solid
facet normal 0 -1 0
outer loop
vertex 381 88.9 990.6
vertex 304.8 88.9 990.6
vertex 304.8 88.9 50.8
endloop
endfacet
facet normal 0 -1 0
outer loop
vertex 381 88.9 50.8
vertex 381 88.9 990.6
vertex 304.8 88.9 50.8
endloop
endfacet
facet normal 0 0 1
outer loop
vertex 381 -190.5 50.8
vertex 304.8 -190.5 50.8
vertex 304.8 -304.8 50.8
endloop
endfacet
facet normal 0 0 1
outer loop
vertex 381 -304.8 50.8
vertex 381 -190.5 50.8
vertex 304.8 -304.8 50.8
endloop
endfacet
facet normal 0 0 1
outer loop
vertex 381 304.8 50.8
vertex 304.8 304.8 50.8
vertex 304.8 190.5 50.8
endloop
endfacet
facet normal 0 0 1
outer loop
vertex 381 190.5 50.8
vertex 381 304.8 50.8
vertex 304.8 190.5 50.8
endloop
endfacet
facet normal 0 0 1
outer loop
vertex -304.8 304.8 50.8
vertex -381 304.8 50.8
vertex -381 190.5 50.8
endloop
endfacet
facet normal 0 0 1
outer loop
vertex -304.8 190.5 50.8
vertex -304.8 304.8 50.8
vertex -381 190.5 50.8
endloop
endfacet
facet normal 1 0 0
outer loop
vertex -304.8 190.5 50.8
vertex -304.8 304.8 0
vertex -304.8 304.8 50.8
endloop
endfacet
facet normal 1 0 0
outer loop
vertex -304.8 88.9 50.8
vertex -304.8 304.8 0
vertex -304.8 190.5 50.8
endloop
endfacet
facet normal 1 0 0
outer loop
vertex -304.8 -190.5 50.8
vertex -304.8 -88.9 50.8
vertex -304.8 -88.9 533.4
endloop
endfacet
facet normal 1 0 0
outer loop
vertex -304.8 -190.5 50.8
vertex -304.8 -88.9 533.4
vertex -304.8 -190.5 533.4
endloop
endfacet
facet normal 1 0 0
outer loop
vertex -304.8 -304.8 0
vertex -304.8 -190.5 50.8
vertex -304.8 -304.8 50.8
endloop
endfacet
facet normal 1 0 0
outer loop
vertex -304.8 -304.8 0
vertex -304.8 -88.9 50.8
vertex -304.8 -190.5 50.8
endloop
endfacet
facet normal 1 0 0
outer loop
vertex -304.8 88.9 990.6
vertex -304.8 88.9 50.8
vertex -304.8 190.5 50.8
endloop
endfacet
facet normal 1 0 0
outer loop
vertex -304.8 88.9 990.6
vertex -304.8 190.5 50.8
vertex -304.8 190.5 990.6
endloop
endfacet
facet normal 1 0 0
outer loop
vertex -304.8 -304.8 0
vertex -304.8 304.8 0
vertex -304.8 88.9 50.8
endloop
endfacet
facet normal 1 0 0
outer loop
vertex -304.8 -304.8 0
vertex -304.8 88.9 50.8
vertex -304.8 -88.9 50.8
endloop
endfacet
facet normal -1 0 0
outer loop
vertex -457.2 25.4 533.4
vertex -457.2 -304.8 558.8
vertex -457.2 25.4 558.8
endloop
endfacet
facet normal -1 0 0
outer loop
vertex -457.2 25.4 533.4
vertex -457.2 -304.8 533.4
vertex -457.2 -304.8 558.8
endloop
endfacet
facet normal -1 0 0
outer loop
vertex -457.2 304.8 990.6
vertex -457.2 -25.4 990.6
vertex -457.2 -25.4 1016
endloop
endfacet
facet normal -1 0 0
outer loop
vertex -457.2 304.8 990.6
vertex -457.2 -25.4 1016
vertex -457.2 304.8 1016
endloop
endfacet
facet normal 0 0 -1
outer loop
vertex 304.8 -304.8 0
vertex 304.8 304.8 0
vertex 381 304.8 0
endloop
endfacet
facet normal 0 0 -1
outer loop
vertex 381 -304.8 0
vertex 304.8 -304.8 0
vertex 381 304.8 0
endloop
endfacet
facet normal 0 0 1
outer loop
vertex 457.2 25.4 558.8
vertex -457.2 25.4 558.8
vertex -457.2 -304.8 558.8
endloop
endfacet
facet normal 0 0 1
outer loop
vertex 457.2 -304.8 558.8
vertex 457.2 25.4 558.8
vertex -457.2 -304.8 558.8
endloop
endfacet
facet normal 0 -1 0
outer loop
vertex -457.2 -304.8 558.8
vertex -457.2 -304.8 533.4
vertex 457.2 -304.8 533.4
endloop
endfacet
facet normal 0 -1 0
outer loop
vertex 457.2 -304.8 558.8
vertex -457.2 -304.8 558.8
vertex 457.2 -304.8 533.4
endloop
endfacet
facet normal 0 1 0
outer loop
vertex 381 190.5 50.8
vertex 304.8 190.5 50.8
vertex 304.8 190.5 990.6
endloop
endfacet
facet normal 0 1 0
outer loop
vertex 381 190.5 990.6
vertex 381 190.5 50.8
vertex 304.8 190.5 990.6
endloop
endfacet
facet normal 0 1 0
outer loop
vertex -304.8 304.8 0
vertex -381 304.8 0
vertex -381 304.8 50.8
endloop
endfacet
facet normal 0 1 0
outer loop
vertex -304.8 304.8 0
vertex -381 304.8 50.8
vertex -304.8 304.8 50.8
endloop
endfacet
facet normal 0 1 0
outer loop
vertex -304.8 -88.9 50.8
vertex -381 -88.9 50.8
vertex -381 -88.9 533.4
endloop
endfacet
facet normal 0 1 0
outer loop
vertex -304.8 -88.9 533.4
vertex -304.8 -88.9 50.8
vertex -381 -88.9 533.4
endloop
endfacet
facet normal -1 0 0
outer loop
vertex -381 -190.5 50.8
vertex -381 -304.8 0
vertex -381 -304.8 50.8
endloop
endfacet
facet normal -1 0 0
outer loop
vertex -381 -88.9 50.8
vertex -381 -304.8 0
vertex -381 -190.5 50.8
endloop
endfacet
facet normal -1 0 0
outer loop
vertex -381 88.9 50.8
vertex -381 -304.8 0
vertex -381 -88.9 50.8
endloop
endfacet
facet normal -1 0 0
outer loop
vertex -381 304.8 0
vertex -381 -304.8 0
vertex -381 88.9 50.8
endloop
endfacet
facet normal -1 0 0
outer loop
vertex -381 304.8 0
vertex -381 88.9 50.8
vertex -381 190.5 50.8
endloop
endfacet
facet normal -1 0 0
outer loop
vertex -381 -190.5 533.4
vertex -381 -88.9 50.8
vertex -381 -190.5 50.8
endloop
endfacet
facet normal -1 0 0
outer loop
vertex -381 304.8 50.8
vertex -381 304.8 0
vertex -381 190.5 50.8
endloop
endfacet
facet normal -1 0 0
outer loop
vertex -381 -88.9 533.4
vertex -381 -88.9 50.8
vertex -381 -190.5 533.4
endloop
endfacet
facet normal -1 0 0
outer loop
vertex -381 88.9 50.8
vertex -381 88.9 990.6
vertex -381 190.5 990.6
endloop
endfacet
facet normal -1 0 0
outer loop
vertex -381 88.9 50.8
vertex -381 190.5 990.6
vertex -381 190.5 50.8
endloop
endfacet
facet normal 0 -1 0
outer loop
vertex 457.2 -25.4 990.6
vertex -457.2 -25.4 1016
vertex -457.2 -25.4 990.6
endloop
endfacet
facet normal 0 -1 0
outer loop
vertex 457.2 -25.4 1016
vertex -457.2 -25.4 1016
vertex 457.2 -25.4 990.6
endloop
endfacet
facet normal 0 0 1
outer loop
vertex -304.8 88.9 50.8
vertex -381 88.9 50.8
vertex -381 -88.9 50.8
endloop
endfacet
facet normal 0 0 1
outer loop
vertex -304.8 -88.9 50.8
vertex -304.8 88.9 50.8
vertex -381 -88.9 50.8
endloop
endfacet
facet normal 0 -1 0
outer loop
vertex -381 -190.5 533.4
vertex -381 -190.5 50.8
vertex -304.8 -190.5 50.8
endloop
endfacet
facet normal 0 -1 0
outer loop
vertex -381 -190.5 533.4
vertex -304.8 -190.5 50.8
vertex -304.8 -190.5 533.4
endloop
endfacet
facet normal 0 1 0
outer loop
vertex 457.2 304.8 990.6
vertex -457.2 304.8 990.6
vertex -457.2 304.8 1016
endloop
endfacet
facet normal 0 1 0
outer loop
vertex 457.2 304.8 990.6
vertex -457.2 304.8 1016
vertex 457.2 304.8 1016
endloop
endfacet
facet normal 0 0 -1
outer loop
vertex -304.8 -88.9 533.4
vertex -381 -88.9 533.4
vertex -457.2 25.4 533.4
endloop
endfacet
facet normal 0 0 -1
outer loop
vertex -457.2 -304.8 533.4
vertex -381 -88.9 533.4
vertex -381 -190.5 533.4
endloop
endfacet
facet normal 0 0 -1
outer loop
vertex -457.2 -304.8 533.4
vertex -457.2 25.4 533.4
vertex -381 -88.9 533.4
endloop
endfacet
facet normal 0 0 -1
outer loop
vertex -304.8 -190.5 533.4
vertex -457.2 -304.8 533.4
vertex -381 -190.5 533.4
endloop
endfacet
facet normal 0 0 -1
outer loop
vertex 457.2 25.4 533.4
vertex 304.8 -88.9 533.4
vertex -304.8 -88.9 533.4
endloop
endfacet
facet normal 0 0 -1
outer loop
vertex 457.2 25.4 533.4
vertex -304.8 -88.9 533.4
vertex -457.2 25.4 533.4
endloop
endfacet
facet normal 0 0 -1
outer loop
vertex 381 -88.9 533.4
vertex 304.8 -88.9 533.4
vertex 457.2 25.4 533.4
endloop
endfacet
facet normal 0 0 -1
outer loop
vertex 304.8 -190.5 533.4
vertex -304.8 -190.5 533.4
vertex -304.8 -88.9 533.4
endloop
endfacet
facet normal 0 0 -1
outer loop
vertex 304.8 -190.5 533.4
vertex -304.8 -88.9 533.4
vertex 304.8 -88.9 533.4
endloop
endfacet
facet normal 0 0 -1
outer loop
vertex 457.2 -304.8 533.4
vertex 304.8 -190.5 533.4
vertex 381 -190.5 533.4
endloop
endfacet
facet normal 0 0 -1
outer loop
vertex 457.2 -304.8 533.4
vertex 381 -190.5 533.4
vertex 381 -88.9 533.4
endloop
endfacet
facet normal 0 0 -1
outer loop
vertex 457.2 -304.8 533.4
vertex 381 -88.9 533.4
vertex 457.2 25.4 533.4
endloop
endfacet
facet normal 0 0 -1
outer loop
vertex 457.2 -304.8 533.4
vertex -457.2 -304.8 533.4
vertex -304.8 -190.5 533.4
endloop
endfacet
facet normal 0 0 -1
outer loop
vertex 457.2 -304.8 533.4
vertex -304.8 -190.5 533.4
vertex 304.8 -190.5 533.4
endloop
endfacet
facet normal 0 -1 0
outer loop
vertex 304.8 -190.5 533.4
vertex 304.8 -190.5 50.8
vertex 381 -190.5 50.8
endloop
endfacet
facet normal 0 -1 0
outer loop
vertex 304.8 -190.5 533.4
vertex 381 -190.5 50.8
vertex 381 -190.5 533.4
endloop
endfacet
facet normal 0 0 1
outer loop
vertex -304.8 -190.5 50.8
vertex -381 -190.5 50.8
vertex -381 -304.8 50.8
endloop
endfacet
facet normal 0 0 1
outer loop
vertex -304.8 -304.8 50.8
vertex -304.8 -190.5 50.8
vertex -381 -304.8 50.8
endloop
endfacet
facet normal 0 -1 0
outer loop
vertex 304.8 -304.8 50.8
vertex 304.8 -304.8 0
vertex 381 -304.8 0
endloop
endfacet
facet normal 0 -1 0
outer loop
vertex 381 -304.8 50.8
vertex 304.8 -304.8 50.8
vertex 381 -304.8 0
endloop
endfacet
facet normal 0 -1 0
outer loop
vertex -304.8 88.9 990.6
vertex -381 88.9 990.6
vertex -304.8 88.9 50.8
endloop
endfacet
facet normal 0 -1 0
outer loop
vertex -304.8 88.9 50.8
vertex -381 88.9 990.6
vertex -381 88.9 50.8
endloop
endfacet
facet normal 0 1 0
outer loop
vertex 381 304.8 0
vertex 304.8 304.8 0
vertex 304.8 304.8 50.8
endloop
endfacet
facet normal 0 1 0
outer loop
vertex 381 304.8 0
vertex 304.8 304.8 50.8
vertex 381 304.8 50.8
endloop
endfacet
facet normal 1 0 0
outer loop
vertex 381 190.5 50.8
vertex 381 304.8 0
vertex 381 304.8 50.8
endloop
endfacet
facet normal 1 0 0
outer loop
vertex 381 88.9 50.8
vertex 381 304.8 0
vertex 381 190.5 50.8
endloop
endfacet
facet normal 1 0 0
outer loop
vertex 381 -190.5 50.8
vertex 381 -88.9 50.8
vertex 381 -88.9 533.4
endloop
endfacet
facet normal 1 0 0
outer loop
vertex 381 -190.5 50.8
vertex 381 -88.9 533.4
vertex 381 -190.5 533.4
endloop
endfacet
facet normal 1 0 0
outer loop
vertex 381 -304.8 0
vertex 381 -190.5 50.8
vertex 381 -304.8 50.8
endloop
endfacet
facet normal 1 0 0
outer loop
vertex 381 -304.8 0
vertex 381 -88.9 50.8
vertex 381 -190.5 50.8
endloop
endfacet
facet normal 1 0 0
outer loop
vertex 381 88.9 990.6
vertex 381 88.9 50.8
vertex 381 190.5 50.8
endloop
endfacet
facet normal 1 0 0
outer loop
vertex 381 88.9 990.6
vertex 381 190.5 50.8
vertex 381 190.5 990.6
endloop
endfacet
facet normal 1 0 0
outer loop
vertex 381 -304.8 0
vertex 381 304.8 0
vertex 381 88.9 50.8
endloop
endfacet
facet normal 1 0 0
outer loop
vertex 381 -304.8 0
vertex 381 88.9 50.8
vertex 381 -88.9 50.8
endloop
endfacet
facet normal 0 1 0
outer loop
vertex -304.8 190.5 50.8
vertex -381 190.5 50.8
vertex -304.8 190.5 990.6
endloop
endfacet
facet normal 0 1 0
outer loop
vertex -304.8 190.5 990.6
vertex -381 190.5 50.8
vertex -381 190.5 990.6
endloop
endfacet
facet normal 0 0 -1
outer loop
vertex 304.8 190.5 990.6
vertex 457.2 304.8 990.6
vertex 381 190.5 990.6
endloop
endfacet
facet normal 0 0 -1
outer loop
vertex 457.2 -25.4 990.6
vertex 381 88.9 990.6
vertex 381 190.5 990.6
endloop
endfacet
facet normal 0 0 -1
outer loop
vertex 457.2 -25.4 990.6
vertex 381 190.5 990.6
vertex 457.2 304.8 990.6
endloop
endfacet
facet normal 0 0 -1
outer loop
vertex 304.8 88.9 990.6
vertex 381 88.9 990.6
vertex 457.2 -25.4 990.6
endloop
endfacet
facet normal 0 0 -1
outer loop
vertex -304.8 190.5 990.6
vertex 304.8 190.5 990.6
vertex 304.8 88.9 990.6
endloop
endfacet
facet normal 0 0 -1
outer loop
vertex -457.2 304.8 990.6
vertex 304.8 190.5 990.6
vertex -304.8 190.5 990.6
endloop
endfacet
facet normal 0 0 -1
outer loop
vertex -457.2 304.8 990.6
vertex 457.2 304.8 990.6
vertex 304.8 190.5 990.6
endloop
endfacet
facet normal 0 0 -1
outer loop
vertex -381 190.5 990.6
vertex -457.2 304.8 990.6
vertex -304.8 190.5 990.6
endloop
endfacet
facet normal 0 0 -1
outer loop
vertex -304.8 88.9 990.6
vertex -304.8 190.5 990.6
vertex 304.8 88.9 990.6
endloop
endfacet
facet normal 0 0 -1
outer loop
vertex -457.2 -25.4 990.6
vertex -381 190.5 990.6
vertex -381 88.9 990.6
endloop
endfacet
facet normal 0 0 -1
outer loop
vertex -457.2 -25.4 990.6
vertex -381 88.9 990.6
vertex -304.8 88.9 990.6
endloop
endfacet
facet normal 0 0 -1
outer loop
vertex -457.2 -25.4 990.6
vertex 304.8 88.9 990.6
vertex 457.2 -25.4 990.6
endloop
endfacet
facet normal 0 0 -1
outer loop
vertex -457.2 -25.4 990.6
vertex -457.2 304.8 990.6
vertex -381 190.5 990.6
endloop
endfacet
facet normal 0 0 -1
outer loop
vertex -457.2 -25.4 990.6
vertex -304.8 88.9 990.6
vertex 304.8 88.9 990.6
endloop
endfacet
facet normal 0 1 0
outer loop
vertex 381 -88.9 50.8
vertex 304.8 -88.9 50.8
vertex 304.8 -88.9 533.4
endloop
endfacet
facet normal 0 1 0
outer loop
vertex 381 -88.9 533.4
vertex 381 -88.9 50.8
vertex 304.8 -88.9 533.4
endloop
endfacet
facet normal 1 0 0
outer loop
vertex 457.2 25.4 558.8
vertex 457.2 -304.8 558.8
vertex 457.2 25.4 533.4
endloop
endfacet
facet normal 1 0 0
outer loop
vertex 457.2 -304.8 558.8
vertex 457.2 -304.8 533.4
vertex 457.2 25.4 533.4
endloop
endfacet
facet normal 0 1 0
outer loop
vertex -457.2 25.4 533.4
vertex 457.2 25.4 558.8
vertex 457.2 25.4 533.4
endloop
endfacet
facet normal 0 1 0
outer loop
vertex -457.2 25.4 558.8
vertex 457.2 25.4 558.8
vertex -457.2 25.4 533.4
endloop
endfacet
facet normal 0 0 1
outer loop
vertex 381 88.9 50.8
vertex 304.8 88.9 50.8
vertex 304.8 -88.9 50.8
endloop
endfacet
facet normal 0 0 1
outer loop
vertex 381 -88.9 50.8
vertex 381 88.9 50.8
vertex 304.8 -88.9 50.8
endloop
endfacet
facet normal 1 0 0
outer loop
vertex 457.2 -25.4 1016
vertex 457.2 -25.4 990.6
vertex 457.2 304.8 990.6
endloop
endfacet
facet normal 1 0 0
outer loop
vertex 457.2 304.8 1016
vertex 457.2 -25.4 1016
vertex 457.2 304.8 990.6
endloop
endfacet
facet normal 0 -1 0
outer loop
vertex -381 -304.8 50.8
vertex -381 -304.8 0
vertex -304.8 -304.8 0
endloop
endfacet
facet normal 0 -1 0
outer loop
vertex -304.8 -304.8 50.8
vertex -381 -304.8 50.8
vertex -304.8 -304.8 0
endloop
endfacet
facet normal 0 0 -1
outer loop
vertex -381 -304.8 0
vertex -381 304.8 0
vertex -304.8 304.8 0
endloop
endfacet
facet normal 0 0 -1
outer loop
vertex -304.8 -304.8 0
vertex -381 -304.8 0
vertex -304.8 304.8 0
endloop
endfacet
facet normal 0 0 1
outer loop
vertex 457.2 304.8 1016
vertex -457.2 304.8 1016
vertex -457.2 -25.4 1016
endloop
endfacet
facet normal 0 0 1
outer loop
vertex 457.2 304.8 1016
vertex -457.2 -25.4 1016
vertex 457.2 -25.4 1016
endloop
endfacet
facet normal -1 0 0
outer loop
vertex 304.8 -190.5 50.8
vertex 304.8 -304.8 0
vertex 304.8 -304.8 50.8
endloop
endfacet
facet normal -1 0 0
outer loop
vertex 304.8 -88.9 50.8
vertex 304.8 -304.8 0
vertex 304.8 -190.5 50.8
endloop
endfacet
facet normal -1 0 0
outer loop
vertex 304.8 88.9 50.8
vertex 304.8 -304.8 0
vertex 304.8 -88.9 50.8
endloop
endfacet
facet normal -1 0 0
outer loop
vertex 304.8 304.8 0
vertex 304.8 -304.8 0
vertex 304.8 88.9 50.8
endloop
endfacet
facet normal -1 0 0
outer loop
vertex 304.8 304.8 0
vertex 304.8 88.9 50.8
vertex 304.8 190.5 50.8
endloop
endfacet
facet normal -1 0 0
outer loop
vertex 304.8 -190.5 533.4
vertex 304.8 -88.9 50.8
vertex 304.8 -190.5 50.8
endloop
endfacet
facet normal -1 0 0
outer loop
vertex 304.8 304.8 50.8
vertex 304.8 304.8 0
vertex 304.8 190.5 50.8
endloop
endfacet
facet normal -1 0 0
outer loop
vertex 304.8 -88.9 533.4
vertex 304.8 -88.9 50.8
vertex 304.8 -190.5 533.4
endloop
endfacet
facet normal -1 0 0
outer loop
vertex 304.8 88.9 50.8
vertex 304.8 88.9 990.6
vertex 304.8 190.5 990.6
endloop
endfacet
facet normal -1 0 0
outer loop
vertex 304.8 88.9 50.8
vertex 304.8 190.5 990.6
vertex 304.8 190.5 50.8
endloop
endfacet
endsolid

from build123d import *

# Parameters (mm, degrees)
F0_W      = 914.4
F0_H      = 609.6
F1_DEPTH  = 1016
F2_W      = 914.4
F2_H      = 279.4
F3_DEPTH  = 457.2
F4_W      = 76.2
F4_H      = 609.6
F4_W_2    = 609.6
F5_DEPTH  = 533.4
F6_W      = 25.4
F6_H      = 431.8
F7_DEPTH  = 914.4
F8_W      = 76.2
F8_H      = 25.4
F8_W_2    = 609.6
F9_DEPTH  = 279.4
F8_H_2    = 431.8
F10_DEPTH = 431.8
F11_DEPTH = 330.2
F12_W     = 114.3
F12_H     = 939.8
F13_DEPTH = 777.24
F12_H_2   = 482.6
F14_DEPTH = 878.84


with BuildPart() as f1:
    # F0 (on Top) → F1 (new body)
    with BuildSketch(Plane.XY):
        Rectangle(F0_W, F0_H)
    extrude(amount=F1_DEPTH)

    # F2 (on face) → F3 (cut)
    with BuildSketch(Plane.XY.offset(1016)):
        with Locations((0, -165.1)):
            Rectangle(F2_W, F2_H)
    extrude(amount=-F3_DEPTH, mode=Mode.SUBTRACT)

    # F4 (on face) → F5 (cut)
    with BuildSketch(Plane(origin=(0, 0, 0), x_dir=(1, 0, 0), z_dir=(0, 0, -1))):
        with Locations((-419.1, 0)):
            Rectangle(F4_W, F4_H)
        with Locations((419.1, 0)):
            Rectangle(F4_W, F4_H)
        Rectangle(F4_W_2, F4_H)
    extrude(amount=-F5_DEPTH, mode=Mode.SUBTRACT)

    # F6 (on face) → F7 (cut)
    with BuildSketch(Plane(origin=(-457.2, 0, 0), x_dir=(0, -1, 0), z_dir=(-1, 0, 0))):
        with Locations((12.7, 774.7)):
            Rectangle(F6_W, F6_H)
    extrude(amount=-F7_DEPTH, mode=Mode.SUBTRACT)

    # F8 (on face) → F9 (cut)
    with BuildSketch(Plane(origin=(0, 304.8, 0), x_dir=(-1, 0, 0), z_dir=(0, 1, 0))):
        with Locations((-419.1, 546.1)):
            Rectangle(F8_W, F8_H)
        with Locations((0, 546.1)):
            Rectangle(F8_W_2, F8_H)
        with Locations((419.1, 546.1)):
            Rectangle(F8_W, F8_H)
    extrude(amount=-F9_DEPTH, mode=Mode.SUBTRACT)

    # F8 (on face) → F10 (cut)
    with BuildSketch(Plane(origin=(0, 304.8, 0), x_dir=(-1, 0, 0), z_dir=(0, 1, 0))):
        with Locations((0, 774.7)):
            Rectangle(F8_W_2, F8_H_2)
    extrude(amount=-F10_DEPTH, mode=Mode.SUBTRACT)

    # F8 (on face) → F11 (cut)
    with BuildSketch(Plane(origin=(0, 304.8, 0), x_dir=(-1, 0, 0), z_dir=(0, 1, 0))):
        with Locations((-419.1, 774.7)):
            Rectangle(F8_W, F8_H_2)
        with Locations((419.1, 774.7)):
            Rectangle(F8_W, F8_H_2)
    extrude(amount=-F11_DEPTH, mode=Mode.SUBTRACT)

    # F12 (on face) → F13 (cut)
    with BuildSketch(Plane(origin=(-381, 0, 0), x_dir=(0, -1, 0), z_dir=(-1, 0, 0))):
        with Locations((-247.65, 520.7)):
            Rectangle(F12_W, F12_H)
    extrude(amount=-F13_DEPTH, mode=Mode.SUBTRACT)

    # F12 (on face) → F14 (cut)
    with BuildSketch(Plane(origin=(-381, 0, 0), x_dir=(0, -1, 0), z_dir=(-1, 0, 0))):
        Polygon((0, 990.6), (-88.9, 990.6), (-88.9, 558.8), (-25.4, 558.8), (0, 558.8), align=None)
        Polygon((-88.9, 558.8), (-88.9, 50.8), (-25.4, 50.8), (-25.4, 533.4), (-25.4, 558.8), align=None)
        with Locations((31.75, 292.1)):
            Rectangle(F12_W, F12_H_2)
        with Locations((247.65, 292.1)):
            Rectangle(F12_W, F12_H_2)
    extrude(amount=-F14_DEPTH, mode=Mode.SUBTRACT)


solid = f1.part
